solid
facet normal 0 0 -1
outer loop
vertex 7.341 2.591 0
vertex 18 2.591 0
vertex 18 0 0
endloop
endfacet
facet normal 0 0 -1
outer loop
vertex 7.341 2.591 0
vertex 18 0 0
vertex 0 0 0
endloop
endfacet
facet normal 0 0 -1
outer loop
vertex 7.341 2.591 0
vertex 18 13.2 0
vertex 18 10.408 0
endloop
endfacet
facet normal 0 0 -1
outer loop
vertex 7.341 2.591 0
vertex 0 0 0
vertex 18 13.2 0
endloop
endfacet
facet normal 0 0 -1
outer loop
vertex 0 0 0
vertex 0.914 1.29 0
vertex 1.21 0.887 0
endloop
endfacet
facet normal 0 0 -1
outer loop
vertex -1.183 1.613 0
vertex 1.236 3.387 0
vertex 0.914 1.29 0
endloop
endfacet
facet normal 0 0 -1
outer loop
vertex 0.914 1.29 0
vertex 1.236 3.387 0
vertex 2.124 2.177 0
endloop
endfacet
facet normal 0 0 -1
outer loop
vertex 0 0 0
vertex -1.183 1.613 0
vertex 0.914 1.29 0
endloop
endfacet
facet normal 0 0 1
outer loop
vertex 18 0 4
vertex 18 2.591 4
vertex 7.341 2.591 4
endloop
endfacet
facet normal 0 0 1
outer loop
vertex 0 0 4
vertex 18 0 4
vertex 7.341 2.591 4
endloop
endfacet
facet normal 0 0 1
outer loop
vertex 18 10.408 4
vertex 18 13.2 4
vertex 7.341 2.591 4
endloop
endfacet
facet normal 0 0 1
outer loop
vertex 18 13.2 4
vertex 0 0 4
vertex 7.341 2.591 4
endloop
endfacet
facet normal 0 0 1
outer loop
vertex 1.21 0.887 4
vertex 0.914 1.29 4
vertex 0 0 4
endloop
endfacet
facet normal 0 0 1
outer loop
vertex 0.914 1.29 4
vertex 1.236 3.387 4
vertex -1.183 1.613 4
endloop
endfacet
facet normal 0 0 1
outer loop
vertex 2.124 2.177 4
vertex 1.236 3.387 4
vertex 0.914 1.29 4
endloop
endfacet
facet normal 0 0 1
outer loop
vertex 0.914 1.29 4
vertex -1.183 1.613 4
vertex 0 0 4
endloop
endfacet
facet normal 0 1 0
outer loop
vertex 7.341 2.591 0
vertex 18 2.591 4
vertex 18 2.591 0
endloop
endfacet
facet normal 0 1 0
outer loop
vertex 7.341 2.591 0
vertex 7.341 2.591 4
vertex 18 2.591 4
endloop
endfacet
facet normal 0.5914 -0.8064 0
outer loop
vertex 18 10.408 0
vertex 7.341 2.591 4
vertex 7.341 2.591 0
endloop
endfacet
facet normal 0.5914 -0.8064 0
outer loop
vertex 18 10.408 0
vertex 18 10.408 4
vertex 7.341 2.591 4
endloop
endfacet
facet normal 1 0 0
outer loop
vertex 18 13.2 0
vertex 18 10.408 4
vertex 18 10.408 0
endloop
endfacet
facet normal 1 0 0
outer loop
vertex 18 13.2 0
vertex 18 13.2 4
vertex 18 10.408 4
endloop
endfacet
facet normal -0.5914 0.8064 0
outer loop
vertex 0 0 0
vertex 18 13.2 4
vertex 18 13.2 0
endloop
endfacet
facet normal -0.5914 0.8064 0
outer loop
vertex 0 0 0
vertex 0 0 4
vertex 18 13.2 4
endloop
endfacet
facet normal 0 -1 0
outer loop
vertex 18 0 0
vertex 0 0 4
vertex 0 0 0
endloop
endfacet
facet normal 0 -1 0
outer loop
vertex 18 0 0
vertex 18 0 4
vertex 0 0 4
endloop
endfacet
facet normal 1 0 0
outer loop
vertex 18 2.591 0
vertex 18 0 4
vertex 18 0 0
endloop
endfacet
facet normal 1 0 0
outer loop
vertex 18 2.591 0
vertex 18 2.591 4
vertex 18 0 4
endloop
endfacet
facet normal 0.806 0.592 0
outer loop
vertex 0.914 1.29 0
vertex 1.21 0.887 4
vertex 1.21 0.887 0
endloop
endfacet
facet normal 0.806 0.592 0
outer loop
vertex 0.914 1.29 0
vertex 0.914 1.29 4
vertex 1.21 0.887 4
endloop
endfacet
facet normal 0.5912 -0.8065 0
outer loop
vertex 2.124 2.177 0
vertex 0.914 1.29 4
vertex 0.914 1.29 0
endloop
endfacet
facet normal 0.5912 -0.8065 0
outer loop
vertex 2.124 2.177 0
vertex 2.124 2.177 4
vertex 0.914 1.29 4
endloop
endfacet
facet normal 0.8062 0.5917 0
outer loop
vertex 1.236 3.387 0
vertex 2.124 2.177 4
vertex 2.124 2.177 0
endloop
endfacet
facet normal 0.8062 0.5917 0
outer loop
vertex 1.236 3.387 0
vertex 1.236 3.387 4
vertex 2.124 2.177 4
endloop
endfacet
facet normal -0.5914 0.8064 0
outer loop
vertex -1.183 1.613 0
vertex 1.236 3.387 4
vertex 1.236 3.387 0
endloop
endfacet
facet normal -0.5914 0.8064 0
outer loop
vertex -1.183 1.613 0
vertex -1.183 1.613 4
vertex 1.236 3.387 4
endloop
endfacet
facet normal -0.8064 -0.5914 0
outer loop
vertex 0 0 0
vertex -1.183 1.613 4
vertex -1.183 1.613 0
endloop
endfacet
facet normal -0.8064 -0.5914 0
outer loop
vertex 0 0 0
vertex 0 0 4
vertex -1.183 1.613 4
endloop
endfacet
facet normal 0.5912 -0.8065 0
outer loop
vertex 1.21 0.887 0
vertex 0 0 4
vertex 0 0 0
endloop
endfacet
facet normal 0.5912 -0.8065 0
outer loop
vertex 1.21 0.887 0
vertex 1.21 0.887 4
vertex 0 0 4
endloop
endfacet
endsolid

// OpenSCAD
module triangle(x,y) {
    polygon(points=[[0,0],[x,0],[x,y]]);
}

x=30;
y=22;

linear_extrude(height=4) {
    
    difference() {
        triangle(x,y);
        
        S=(y-3)/y;
        {scale([S, S, S]) translate([8.5,3,0]) { triangle(x,y);}
        translate([18,0,0]) square(40);
        }
    }
    
    rotate(atan(y/x)) difference() {
        square([3,2]);
        translate([1.5,0,0]) {square([1.5, 0.5]);} 
    }

}
